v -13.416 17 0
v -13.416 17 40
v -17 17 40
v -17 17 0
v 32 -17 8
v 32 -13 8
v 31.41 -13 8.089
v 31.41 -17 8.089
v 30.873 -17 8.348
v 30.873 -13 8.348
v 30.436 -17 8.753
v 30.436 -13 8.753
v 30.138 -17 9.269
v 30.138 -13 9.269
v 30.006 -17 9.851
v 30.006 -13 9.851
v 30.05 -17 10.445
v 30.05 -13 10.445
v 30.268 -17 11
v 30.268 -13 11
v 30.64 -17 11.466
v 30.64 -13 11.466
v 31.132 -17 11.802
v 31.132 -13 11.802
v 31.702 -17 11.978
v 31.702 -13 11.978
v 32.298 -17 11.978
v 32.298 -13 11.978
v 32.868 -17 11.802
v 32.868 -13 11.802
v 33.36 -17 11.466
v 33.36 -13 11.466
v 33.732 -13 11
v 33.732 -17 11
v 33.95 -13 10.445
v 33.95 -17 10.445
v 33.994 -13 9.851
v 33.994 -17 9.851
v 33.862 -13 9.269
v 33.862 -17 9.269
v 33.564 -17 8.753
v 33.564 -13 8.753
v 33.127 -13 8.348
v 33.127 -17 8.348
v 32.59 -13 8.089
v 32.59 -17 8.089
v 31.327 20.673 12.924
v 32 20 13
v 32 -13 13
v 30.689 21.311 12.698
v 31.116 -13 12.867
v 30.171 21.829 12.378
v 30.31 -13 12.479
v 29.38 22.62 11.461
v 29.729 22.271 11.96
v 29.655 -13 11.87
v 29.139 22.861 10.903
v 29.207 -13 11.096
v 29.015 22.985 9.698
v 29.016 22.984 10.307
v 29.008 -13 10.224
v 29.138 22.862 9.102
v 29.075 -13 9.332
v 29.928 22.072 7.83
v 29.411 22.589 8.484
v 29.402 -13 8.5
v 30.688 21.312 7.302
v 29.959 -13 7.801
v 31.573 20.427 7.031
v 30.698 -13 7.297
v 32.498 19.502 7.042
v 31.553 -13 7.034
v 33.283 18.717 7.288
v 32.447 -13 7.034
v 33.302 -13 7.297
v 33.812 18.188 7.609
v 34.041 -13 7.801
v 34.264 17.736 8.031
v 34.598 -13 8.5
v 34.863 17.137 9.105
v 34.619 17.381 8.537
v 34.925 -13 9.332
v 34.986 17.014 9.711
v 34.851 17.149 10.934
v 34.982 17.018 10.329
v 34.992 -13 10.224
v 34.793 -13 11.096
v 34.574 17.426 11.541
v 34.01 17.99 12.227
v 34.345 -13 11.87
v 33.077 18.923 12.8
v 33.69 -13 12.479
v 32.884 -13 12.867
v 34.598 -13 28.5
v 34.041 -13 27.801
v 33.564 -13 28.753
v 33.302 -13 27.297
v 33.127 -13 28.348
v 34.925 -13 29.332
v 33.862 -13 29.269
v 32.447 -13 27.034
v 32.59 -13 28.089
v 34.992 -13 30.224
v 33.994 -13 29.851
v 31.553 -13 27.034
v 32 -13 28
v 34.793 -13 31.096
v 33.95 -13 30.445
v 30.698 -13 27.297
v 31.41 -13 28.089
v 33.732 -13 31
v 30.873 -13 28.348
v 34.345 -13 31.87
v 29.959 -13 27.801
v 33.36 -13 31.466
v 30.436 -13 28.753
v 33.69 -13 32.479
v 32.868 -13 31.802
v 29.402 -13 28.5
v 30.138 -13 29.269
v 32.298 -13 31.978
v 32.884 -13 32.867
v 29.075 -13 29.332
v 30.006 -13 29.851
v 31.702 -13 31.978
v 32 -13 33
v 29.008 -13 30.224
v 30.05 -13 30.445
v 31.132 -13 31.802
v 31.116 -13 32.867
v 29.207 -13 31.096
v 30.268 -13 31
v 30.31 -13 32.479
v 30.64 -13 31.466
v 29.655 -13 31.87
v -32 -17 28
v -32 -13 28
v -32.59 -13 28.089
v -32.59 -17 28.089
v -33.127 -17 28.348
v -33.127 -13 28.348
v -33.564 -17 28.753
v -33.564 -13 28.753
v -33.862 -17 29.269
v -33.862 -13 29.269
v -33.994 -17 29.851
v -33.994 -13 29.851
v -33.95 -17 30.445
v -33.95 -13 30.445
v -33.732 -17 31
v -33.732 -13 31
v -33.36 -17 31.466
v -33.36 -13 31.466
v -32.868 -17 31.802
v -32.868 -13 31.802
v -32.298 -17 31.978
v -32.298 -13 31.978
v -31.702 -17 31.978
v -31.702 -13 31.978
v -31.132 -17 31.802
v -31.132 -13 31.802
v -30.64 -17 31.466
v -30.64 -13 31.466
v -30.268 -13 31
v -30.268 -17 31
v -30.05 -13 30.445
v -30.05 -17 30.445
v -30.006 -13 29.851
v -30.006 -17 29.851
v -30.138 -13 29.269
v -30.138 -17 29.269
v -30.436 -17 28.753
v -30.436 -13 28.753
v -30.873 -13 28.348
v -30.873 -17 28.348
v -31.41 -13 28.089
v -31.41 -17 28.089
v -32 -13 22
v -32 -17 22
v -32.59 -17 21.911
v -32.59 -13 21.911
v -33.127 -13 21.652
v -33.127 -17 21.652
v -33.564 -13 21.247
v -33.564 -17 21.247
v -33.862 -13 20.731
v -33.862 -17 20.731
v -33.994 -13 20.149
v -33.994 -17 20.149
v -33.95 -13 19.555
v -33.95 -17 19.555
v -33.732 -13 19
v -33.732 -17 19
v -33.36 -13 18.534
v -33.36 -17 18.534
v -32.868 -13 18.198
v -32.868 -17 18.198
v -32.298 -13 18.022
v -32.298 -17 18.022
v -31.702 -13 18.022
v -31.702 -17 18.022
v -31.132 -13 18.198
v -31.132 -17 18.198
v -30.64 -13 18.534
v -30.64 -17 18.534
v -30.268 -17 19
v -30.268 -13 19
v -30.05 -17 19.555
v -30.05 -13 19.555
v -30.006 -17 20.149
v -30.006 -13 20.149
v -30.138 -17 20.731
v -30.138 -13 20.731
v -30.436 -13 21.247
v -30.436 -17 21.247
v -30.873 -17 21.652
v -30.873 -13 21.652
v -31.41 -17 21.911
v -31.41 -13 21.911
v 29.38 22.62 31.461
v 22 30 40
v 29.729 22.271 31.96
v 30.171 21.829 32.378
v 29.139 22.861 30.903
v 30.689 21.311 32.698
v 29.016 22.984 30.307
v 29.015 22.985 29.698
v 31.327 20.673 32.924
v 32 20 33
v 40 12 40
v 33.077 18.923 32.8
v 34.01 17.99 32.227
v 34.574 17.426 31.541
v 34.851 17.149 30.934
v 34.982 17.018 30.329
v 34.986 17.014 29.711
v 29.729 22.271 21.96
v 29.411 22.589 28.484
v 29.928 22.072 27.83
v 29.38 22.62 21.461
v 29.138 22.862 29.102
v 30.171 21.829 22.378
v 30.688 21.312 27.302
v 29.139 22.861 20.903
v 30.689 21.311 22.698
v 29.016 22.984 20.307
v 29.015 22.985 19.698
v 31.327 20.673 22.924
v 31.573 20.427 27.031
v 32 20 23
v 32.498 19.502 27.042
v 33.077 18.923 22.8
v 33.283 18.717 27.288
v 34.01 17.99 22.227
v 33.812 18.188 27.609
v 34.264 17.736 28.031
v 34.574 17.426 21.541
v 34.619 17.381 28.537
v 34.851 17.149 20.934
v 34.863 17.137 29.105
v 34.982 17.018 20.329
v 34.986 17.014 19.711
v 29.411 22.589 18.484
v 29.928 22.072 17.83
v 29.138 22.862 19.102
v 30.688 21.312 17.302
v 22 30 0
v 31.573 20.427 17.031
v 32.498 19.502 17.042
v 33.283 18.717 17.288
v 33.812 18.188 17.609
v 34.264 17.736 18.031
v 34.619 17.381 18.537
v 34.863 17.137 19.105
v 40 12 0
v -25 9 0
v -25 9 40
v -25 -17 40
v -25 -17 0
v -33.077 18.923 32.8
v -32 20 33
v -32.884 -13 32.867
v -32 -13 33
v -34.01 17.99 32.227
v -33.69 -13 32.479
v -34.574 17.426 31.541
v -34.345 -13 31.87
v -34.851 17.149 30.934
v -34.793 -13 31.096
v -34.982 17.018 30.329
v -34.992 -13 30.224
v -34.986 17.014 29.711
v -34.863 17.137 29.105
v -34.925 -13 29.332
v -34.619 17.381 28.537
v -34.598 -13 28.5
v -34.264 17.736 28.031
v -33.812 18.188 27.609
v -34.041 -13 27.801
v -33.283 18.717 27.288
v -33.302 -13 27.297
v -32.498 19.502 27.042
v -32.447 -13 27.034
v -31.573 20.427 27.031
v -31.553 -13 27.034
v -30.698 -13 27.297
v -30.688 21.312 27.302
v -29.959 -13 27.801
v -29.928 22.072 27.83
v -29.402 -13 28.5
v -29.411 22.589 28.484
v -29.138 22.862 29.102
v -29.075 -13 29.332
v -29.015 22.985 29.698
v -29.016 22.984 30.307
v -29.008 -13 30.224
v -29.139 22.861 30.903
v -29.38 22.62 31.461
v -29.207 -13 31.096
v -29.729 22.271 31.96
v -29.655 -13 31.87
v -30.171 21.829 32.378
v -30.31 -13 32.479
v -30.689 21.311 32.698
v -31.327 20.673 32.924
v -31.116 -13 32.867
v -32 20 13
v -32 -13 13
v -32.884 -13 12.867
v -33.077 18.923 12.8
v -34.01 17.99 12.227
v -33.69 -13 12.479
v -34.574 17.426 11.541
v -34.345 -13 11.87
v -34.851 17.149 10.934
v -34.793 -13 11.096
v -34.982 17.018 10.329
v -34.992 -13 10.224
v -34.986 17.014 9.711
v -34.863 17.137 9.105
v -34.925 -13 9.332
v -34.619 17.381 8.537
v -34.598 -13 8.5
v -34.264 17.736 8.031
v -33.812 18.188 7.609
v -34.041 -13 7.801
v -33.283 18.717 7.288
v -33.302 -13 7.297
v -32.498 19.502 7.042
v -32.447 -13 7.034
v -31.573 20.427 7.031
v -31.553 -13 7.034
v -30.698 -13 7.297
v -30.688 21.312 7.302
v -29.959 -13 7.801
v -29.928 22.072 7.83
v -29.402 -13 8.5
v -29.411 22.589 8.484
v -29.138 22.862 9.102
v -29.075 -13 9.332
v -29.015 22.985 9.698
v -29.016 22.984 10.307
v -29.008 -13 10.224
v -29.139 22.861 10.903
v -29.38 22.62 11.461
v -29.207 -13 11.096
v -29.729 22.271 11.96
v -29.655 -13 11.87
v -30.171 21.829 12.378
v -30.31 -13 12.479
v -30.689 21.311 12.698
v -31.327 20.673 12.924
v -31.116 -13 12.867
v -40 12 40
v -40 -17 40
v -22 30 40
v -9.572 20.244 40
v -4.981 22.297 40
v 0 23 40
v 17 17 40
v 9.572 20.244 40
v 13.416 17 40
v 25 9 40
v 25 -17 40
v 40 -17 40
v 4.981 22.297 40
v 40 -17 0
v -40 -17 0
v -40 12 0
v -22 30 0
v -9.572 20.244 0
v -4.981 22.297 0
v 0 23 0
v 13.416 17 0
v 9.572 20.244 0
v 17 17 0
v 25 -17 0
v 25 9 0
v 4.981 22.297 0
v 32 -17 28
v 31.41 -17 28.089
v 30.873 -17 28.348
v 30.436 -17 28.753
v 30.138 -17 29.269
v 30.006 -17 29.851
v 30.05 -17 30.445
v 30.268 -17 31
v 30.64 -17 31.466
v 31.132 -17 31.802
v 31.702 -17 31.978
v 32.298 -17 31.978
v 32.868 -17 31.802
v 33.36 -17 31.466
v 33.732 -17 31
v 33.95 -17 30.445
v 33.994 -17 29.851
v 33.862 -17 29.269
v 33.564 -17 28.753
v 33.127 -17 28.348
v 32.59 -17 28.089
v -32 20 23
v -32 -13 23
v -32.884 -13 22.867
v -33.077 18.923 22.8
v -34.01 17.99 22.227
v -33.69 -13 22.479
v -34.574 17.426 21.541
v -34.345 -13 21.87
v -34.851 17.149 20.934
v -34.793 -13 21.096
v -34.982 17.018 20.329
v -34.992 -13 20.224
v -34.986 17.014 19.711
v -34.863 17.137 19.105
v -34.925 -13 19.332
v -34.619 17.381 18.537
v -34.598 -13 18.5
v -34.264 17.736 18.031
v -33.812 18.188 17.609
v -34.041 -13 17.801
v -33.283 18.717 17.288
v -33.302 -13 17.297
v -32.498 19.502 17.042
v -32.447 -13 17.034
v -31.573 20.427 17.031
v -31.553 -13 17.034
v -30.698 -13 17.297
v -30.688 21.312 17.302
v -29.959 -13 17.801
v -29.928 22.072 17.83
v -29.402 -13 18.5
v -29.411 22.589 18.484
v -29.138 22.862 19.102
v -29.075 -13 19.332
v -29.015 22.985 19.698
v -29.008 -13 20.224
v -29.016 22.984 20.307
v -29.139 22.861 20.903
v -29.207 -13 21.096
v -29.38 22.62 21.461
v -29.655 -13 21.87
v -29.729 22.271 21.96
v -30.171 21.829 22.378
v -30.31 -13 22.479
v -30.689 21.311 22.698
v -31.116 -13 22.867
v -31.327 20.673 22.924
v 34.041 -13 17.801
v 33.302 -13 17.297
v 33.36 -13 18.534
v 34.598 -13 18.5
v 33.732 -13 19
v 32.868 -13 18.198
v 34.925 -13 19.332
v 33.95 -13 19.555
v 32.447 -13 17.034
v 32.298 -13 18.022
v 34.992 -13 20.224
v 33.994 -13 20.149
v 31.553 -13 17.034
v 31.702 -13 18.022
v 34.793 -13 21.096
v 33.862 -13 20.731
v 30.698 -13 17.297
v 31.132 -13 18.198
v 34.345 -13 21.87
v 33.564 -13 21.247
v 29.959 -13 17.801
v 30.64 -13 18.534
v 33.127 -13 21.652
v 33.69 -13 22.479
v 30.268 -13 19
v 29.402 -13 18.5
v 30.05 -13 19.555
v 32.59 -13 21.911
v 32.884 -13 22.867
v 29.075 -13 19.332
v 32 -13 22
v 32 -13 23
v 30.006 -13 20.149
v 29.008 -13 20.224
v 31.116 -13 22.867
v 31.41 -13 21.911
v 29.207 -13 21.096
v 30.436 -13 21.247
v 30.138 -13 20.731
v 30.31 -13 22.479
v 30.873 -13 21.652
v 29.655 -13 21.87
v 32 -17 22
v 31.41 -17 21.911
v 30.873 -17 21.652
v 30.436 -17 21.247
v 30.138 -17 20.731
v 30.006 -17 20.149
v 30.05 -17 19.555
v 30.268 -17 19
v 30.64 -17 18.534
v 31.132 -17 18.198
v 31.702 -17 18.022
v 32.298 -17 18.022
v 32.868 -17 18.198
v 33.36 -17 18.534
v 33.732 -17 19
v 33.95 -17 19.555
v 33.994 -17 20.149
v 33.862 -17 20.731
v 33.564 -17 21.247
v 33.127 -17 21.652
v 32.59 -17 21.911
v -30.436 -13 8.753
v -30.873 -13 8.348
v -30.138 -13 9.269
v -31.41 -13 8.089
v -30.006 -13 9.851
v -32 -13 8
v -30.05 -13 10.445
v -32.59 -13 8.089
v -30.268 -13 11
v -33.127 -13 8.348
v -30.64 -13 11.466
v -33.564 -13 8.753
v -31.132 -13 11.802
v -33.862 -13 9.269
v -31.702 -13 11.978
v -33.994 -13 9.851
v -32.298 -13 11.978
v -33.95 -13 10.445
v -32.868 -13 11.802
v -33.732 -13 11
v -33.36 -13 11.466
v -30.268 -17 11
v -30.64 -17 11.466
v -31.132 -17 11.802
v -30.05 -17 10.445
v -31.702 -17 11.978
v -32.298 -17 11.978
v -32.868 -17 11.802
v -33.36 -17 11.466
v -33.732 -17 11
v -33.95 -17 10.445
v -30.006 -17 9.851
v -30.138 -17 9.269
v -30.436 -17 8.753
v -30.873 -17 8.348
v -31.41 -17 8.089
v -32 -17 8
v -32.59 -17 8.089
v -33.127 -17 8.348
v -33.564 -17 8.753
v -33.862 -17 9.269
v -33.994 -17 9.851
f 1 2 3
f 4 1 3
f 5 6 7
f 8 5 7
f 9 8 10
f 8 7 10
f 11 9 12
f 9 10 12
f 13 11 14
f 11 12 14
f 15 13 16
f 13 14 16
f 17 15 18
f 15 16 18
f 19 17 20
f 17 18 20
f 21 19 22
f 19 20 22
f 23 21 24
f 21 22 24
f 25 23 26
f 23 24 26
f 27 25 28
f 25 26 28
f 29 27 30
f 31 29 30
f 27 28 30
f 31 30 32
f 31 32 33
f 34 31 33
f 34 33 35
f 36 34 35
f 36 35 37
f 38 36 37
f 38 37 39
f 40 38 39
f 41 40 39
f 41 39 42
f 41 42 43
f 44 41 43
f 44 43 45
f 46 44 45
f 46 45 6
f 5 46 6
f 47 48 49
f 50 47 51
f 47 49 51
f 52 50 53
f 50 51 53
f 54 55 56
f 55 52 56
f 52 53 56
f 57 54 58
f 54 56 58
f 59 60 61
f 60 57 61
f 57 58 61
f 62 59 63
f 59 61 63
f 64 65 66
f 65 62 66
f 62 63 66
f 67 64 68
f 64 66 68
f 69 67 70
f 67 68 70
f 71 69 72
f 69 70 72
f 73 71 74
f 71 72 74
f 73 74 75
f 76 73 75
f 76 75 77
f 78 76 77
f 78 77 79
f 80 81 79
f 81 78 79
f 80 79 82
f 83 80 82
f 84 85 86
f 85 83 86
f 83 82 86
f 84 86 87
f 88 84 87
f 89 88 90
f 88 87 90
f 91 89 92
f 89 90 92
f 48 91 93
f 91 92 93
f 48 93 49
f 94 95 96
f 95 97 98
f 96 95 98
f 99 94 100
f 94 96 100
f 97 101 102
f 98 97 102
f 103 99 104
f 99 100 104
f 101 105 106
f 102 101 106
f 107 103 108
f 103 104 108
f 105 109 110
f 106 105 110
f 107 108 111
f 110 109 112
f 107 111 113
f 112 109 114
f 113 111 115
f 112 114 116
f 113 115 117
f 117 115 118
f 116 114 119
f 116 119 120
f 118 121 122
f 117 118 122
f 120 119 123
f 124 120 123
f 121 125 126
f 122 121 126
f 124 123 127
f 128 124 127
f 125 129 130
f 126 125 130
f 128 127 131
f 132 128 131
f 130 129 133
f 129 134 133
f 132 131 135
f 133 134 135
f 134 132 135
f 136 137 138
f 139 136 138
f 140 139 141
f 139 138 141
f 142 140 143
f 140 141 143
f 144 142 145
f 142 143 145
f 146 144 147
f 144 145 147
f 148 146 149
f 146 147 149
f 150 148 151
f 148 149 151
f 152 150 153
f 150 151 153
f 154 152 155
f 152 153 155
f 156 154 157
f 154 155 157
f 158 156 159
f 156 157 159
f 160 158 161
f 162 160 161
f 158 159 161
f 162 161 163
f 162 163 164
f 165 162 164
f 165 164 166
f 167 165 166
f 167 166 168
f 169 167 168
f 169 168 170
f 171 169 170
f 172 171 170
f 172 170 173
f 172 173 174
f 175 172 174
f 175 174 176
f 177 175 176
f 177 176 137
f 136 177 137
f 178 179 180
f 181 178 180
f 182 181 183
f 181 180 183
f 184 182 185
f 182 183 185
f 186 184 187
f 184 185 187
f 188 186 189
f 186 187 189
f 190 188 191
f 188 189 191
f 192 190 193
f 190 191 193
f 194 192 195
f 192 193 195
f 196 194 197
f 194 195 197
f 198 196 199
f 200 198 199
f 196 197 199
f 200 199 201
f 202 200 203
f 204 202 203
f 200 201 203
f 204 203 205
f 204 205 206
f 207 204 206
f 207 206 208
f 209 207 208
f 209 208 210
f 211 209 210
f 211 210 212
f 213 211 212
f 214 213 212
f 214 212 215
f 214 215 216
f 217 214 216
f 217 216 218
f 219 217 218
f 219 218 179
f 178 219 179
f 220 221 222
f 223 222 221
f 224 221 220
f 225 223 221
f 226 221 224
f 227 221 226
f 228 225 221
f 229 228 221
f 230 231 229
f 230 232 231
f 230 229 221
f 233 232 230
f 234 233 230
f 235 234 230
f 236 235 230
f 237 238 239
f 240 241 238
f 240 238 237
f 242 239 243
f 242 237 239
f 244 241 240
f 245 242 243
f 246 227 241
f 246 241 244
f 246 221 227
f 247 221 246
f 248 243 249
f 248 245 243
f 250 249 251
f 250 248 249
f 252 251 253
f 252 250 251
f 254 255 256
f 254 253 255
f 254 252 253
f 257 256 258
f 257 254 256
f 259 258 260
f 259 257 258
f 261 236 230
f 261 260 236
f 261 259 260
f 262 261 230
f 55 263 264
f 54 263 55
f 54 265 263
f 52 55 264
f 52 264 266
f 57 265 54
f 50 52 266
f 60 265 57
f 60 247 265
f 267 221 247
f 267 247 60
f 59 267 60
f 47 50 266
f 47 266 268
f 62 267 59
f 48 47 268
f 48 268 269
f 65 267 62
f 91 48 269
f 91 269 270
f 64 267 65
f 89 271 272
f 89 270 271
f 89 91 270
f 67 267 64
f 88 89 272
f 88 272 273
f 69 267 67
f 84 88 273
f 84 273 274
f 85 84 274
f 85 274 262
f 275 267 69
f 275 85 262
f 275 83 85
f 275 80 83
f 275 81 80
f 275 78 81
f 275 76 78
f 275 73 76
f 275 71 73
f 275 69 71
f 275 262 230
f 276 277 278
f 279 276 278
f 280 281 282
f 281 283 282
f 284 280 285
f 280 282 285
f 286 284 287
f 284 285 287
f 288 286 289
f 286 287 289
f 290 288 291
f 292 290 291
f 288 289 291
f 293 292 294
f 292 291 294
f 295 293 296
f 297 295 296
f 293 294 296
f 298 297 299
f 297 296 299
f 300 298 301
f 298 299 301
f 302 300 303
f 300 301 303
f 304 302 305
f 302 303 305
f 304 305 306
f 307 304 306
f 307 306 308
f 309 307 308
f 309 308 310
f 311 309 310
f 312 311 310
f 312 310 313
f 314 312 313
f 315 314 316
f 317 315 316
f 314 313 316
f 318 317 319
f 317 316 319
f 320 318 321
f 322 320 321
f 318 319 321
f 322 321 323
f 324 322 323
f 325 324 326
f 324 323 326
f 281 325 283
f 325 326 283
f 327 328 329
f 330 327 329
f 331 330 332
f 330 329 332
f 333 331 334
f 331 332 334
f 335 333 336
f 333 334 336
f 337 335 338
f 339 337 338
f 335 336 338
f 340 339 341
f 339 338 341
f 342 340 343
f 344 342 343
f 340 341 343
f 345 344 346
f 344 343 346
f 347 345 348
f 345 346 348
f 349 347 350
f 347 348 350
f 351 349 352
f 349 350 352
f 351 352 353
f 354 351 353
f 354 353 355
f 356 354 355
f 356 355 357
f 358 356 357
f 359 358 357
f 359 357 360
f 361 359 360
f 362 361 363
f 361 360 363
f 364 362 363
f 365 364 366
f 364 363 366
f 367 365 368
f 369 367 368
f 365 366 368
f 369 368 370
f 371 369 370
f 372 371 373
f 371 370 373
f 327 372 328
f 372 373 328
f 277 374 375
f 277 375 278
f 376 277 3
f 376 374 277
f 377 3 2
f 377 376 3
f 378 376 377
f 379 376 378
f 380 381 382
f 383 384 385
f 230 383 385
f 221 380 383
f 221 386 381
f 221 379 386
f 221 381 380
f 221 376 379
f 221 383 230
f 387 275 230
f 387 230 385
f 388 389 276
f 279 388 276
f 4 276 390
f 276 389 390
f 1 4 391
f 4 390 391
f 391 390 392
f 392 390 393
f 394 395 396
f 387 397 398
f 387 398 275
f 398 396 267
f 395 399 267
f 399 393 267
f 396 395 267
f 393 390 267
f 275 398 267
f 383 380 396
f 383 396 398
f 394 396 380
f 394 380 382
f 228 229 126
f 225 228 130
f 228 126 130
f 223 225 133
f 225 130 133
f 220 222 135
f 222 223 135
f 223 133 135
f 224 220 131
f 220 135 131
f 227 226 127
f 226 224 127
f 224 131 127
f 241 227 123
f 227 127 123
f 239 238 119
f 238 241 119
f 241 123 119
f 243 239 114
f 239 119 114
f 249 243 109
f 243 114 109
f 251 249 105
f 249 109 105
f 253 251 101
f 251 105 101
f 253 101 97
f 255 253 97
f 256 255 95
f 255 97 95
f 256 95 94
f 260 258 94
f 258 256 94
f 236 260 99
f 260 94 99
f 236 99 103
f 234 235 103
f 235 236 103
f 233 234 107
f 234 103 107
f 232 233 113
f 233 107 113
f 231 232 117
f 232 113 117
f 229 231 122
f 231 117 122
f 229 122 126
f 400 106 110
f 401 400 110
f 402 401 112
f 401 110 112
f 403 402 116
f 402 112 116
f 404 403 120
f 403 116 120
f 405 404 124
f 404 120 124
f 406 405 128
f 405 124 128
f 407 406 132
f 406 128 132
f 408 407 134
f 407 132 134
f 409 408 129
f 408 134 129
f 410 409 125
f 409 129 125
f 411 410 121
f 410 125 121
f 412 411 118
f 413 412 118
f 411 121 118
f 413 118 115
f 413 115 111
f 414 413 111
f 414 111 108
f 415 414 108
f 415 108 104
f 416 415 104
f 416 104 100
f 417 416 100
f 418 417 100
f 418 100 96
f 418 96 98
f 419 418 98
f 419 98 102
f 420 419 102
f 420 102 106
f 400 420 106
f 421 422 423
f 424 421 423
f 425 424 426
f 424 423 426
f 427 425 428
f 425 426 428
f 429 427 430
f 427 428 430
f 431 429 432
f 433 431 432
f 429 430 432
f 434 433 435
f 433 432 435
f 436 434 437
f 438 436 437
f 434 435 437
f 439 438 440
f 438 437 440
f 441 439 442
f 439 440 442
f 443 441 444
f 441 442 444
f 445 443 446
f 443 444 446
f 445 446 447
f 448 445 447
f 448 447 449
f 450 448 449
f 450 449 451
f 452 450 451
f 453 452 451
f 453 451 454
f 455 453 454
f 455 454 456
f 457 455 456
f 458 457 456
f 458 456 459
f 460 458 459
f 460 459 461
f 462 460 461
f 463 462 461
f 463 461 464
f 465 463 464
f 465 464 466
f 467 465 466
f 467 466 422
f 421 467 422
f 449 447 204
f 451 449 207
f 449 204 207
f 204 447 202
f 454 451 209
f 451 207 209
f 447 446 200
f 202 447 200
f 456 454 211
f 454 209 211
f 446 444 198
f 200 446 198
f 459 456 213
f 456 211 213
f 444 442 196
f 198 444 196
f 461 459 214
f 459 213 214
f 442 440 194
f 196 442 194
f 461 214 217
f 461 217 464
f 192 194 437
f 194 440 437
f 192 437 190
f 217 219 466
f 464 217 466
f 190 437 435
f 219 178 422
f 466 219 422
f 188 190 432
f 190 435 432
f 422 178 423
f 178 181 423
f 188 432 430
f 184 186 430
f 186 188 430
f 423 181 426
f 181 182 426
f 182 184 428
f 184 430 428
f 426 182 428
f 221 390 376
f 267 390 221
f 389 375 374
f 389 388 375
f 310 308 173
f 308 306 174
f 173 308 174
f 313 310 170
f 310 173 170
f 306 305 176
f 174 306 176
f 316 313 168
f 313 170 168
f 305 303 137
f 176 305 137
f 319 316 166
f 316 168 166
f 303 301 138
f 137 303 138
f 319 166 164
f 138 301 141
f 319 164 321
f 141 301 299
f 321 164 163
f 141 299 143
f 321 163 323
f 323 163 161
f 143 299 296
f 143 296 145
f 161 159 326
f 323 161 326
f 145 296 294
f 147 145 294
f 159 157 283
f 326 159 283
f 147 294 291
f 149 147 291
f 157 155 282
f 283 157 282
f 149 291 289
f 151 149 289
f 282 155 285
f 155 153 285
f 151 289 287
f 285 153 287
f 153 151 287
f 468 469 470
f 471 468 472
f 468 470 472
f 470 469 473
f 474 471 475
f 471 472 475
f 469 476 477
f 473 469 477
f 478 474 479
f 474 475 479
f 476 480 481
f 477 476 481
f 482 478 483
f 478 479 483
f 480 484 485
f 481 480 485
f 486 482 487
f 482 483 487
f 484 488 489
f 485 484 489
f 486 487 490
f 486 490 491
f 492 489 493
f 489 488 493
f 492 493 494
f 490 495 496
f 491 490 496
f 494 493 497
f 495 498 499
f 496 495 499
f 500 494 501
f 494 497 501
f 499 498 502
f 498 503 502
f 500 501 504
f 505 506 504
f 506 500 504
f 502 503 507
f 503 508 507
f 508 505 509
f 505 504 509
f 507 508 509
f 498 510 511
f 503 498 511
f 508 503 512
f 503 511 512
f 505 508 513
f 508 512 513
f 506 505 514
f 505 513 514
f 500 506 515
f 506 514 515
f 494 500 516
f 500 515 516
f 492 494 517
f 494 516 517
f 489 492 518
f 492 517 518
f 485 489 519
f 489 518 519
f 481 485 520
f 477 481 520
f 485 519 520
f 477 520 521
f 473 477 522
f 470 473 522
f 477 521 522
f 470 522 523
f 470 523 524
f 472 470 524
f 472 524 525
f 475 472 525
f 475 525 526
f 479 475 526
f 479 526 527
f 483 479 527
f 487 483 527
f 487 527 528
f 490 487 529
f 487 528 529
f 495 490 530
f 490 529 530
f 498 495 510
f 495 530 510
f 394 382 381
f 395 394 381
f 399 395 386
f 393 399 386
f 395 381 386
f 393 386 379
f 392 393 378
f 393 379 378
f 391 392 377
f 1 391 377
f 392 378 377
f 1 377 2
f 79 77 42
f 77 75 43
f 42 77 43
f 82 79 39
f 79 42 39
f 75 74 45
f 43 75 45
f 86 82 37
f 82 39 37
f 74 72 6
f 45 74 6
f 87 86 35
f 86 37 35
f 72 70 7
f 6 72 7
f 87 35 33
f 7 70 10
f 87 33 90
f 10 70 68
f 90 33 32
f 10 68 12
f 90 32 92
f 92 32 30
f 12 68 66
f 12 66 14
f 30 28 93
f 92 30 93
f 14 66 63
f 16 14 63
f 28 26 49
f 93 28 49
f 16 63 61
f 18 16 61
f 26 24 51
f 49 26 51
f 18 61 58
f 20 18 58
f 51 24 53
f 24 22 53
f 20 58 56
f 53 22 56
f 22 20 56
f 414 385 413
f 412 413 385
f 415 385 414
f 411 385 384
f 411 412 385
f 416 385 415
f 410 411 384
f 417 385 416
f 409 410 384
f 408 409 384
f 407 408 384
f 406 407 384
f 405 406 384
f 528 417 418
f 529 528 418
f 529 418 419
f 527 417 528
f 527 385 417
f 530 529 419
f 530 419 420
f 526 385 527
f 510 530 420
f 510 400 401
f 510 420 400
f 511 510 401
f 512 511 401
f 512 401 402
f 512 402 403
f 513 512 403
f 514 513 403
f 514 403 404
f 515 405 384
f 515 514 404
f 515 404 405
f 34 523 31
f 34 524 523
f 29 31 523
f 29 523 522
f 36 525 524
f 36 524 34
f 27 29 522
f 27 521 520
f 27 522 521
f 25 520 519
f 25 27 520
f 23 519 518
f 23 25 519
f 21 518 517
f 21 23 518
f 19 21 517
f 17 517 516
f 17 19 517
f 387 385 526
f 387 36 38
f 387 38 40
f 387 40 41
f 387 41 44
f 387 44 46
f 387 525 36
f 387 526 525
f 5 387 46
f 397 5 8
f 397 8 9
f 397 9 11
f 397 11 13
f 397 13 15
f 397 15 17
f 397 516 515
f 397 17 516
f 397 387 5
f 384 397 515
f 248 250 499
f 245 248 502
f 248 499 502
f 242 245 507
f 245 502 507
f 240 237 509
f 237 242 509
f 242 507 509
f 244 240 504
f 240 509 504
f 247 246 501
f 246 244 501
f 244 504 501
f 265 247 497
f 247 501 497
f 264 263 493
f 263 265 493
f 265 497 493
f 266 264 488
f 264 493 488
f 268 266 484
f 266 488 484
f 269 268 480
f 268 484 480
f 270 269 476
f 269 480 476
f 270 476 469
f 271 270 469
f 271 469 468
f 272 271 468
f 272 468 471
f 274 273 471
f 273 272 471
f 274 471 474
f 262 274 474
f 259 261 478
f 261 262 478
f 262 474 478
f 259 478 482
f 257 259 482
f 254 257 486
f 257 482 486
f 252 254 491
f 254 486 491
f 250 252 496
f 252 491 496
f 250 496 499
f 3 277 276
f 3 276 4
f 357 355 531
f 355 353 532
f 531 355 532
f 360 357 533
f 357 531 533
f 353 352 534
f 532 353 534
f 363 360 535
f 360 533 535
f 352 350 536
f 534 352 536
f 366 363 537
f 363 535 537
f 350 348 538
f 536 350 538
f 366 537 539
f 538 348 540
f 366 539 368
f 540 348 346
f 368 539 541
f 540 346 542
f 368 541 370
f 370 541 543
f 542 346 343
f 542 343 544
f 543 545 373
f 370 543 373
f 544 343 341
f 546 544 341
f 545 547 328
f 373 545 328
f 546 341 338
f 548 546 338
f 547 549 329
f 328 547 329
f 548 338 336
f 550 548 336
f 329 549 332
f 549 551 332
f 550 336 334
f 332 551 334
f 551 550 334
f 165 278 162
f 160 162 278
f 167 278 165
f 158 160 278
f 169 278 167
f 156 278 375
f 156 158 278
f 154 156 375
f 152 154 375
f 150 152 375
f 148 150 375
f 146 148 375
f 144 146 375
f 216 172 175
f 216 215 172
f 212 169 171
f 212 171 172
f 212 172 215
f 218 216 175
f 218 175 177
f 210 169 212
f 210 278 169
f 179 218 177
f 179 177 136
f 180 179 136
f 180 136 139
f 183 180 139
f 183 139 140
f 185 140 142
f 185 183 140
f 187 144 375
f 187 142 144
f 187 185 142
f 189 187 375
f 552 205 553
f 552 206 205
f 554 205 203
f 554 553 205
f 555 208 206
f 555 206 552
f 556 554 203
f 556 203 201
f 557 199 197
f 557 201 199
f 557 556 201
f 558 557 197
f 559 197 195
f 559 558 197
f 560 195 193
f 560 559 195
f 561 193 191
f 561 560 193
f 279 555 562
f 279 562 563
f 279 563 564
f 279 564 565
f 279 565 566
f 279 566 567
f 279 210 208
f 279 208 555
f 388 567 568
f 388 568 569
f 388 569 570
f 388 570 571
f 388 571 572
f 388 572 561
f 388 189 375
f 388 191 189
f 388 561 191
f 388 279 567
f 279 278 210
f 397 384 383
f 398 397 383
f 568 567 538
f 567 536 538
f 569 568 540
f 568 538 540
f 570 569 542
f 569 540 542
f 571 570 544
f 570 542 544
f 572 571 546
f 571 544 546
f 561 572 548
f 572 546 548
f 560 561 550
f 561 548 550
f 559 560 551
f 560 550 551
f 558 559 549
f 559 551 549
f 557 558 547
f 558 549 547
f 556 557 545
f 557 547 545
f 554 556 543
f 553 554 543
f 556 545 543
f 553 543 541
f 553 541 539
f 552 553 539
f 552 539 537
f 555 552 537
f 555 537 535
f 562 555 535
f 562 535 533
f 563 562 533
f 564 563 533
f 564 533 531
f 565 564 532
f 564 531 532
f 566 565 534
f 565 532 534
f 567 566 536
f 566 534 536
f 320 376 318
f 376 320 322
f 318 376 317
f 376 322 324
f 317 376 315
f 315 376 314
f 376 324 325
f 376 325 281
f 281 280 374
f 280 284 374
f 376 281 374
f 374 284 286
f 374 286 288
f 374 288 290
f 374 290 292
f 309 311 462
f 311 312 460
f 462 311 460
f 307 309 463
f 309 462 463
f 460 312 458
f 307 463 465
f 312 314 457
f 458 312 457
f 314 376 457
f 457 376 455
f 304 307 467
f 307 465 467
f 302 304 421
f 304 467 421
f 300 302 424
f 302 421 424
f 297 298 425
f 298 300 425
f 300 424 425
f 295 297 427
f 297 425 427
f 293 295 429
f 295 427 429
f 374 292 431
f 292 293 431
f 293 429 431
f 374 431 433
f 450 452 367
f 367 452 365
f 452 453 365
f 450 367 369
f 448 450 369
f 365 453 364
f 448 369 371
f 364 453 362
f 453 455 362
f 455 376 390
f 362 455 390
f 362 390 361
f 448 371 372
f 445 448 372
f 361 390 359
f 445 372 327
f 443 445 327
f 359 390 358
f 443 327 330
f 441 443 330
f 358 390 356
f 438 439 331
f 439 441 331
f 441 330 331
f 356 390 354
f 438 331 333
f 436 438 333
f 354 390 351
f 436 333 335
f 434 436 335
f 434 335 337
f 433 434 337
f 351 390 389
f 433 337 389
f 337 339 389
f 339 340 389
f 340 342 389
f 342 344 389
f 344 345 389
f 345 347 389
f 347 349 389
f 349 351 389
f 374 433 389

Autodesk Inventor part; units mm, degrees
ref_plane "YZ Plane" through (0, 0, 0) normal (1, 0, 0) x (0, 1, 0)
ref_plane "XZ Plane" through (0, 0, 0) normal (0, 1, 0) x (-1, 0, 0)
ref_plane "XY Plane" through (0, 0, 0) normal (0, 0, 1) x (1, 0, 0)
sketch "Esquisse1" plane through (0, 0, 0) normal (0, 0, 1) x (1, 0, 0)
  line L0 (-40, 30) -> (40, 30)
  line L1 (40, 30) -> (40, -17)
  line L2 (40, -17) -> (-40, -17)
  line L3 (-40, -17) -> (-40, 30)
  point P0 (0, 0)
  dimension "d0" = 47
  dimension "d1" = 80
  dimension "d2" = 40
  dimension "d3" = 30
extrude "Extrusion1" add sketch "Esquisse1" along normal blind 40
sketch "Esquisse2" plane through (0, 0, 40) normal (0, 0, 1) x (1, 0, 0)
  circle A0 centre (0, 5) radius 18
  line L0 (40, -17) -> (40, 30) projected
  line L1 (-40, 30) -> (40, 30) projected
  point P0 (0, 0)
  dimension "d6" = 36
  dimension "d7" = 40
  dimension "d8" = 25
extrude "Extrusion2" cut sketch "Esquisse2" against normal blind 40
sketch "Esquisse3" plane through (0, 0, 40) normal (0, 0, 1) x (1, 0, 0)
  circle A0 centre (0, 5) radius 18 projected
  line L0 (40, -17) -> (-40, -17) projected
  line L1 (-25, -17) -> (25, -17)
  line L2 (25, -17) -> (25, 9)
  line L3 (-25, 9) -> (-25, -17)
  line L4 (-25, 9) -> (-17, 17)
  line L5 (17, 17) -> (25, 9)
  line L6 (17, 17) -> (13.4164, 17)
  line L7 (-13.4164, 17) -> (-17, 17)
  point P0 (0, 0)
  point P1 (25, 17)
  point P2 (-25, 17)
extrude "Extrusion3" cut sketch "Esquisse3" against normal blind 40
sketch "Esquisse4" plane through (-40, -17, 0) normal (0, -1, 0) x (1, 0, 0)
  line L0 (8, 10) -> (72, 10)
  line L1 (72, 10) -> (72, 30)
  line L2 (72, 30) -> (8, 30)
  line L3 (8, 30) -> (8, 10)
  line L4 (0, 40) -> (80, 40) projected
  line L5 (80, 0) -> (0, 0) projected
  point P0 (40, 0)
  point P1 (15, 40)
  point P2 (65, 0)
  dimension "d23" = 64
  dimension "d24" = 32
  dimension "d25" = 10
  dimension "d26" = 10
hole "Perçage1" at (-32, -17, 30) at (32, -17, 30) at (32, -17, 10) at (-32, -17, 10) direction (0, 1, 0) diameter 4 depth 100 tip angle 118
sketch "Esquisse5" plane through (-40, 30, 0) normal (0, 1, 0) x (1, 0, 0)
  circle A0 centre (72, -30) radius 2 projected
  line L0 (8, -10) -> (72, -10)
  line L1 (72, -10) -> (72, -30)
  line L2 (72, -30) -> (8, -30)
  line L3 (8, -30) -> (8, -10)
  circle A1 centre (8, -10) radius 2 projected
  line L4 (8, -20) -> (72, -20)
  point P0 (40, 0)
hole "Perçage2" at (-32, 30, 10) at (-32, 30, 20) at (-32, 30, 30) at (32, 30, 30) at (32, 30, 20) at (32, 30, 10) direction (0, -1, 0) diameter 4 depth 100 tip angle 118 counterbore diameter 6 counterbore depth 43
chamfer "Chanfrein2" distance 18 distance2 18 1 edges at (40, 30, 20)
chamfer "Chanfrein3" distance 18 distance2 18 1 edges at (-40, 30, 20)
properties part number "Soutient_Mot"
